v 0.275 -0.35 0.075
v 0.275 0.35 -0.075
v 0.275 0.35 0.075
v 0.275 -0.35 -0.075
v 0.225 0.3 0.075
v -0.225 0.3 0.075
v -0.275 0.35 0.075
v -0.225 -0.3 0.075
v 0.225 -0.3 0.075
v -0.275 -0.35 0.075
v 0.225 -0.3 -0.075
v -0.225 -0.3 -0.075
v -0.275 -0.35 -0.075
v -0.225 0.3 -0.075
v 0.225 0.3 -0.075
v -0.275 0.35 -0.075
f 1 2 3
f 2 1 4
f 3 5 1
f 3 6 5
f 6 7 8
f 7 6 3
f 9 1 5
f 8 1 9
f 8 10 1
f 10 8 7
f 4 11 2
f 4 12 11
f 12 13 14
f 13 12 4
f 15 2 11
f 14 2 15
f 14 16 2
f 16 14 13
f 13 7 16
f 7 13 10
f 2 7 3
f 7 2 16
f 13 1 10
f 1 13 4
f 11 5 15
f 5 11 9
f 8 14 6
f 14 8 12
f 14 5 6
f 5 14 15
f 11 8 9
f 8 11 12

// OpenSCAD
edges = 1; // set by Makefile
canvas = 1; // set by Makefile

if (edges == 1) {
    difference() {
        cube([0.55, 0.7, 0.15], center = true);
        cube([0.45, 0.6, 0.2], center = true);
    }
}
